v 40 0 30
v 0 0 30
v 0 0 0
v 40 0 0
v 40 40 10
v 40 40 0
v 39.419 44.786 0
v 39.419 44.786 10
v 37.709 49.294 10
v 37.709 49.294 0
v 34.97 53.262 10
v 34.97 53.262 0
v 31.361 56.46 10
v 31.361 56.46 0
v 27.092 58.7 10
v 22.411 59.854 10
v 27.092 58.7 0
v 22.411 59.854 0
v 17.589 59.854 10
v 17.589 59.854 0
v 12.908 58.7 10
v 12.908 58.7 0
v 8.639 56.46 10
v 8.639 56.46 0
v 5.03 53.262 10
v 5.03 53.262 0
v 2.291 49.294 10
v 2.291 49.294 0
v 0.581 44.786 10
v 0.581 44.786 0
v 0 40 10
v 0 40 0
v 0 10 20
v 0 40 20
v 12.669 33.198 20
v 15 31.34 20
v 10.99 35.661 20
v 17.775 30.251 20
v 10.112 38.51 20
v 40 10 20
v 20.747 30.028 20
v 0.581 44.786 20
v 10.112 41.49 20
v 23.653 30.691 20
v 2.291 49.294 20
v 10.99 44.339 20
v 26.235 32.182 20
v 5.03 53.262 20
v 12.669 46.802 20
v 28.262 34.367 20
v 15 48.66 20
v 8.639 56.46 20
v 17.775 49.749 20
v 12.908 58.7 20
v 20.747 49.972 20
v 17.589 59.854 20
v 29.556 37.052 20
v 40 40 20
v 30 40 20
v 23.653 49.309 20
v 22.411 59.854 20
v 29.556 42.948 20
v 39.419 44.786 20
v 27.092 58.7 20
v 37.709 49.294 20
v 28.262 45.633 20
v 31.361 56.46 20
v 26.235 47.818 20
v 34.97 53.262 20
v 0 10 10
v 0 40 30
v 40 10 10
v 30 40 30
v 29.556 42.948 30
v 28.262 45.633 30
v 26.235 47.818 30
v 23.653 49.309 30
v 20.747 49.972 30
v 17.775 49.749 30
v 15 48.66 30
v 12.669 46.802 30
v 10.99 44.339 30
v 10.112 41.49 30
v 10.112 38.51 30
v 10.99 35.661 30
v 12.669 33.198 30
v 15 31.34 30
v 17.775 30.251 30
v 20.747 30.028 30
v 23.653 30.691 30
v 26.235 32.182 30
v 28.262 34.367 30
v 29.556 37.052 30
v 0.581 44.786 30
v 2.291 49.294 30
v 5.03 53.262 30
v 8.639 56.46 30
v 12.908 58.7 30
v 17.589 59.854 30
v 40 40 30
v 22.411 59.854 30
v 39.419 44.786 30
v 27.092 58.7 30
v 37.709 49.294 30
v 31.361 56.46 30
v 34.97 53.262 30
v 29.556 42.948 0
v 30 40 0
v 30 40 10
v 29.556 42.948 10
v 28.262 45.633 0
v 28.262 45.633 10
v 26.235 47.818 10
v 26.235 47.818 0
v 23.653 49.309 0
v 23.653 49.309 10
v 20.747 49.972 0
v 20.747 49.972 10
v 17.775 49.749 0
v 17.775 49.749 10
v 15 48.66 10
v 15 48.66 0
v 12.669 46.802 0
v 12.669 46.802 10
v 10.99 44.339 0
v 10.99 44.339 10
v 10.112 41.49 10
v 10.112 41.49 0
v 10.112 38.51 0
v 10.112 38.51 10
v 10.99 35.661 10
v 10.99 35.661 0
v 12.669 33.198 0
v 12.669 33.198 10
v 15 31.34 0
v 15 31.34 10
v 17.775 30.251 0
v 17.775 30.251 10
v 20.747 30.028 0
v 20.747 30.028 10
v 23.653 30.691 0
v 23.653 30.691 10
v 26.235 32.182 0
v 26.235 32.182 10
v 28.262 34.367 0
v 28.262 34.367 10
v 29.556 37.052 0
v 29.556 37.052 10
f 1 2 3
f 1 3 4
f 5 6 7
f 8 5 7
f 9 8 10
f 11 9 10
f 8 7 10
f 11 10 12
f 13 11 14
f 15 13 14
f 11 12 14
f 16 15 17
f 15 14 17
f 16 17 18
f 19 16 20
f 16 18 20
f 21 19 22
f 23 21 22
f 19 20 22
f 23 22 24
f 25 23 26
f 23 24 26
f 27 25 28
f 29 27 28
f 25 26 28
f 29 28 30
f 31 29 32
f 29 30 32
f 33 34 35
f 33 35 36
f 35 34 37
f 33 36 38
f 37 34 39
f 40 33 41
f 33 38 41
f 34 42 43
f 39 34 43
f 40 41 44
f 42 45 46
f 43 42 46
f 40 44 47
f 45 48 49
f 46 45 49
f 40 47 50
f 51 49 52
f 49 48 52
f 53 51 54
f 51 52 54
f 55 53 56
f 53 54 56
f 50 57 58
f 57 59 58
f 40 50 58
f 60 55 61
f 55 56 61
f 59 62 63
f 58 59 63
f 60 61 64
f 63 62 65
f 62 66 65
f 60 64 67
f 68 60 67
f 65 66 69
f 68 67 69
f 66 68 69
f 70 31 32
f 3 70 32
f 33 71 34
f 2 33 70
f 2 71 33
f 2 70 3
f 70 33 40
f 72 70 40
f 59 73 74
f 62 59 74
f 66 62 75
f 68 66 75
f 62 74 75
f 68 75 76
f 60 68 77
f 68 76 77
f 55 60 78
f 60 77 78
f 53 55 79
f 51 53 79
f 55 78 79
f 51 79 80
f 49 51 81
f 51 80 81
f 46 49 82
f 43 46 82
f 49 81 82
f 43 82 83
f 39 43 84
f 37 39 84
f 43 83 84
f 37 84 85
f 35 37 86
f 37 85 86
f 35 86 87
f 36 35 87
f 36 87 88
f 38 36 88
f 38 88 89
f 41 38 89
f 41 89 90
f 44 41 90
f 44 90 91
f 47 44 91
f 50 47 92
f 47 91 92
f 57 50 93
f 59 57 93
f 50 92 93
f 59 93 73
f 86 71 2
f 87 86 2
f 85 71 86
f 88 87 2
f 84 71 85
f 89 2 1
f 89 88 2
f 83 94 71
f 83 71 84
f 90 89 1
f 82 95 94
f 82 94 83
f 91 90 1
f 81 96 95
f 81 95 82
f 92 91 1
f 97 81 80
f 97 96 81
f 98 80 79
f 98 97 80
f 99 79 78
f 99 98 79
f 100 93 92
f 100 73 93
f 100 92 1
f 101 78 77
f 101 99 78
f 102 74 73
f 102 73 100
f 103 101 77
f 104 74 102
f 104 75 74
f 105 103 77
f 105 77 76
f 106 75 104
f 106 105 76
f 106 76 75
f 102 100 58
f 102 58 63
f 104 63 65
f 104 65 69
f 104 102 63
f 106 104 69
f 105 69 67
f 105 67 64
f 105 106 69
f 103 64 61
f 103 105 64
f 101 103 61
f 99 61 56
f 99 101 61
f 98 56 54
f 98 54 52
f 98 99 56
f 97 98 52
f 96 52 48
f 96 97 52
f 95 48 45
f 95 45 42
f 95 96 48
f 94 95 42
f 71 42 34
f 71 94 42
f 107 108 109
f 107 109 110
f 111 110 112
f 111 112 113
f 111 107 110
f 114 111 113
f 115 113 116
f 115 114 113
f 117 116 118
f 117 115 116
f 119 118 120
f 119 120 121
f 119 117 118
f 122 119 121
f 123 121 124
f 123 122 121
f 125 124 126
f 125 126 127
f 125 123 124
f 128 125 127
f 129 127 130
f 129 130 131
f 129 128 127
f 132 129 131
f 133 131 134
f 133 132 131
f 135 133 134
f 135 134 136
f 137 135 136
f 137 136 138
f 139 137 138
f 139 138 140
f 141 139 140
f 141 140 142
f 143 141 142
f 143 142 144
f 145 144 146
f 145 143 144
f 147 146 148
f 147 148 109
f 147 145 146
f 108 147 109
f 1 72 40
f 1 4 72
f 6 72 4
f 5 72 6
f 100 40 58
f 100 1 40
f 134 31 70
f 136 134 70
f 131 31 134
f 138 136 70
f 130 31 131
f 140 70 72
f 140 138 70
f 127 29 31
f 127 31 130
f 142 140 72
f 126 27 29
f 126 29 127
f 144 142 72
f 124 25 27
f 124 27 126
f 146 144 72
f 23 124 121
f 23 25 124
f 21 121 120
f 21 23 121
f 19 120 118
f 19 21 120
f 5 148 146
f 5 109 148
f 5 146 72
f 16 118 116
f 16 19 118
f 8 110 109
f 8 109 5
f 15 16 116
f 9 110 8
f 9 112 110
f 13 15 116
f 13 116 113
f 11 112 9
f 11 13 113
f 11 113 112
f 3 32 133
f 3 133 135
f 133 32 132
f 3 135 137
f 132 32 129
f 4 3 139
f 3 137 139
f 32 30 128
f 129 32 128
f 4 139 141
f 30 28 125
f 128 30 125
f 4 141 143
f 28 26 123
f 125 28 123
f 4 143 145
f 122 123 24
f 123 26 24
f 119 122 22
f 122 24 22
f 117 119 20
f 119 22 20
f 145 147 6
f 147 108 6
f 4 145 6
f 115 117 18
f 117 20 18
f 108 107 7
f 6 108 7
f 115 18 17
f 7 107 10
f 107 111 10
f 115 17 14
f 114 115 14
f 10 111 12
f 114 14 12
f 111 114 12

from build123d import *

# Parameters (mm, degrees)
SKETCH1_W           = 40
SKETCH1_H           = 10
BOSS_EXTRUDE1_DEPTH = 15
SKETCH1_3_R         = 10
BOSS_EXTRUDE2_DEPTH = 10


with BuildPart() as part:
    # Sketch1 → Boss-Extrude1 (new body)
    with BuildSketch(Plane.XY):
        with Locations((20, 5)):
            Rectangle(SKETCH1_W, SKETCH1_H)
    boss_extrude1 = extrude(amount=BOSS_EXTRUDE1_DEPTH)

    # Sketch1<3> → Boss-Extrude2 (add)
    with BuildSketch(Plane.XY):
        with BuildLine():
            Line((0, 40), (0, 10))
            Line((0, 10), (40, 10))
            Line((40, 10), (40, 40))
            ThreePointArc((40, 40), (20, 60), (0, 40))
        make_face()
        with Locations((20, 40)):
            Circle(SKETCH1_3_R, mode=Mode.SUBTRACT)
    boss_extrude2 = extrude(amount=BOSS_EXTRUDE2_DEPTH)

    # Mirror1: Boss-Extrude1, Boss-Extrude2 across plane
    add(boss_extrude1.mirror(Plane.XY.offset(15)))
    add(boss_extrude2.mirror(Plane.XY.offset(15)))


solid = part.part
